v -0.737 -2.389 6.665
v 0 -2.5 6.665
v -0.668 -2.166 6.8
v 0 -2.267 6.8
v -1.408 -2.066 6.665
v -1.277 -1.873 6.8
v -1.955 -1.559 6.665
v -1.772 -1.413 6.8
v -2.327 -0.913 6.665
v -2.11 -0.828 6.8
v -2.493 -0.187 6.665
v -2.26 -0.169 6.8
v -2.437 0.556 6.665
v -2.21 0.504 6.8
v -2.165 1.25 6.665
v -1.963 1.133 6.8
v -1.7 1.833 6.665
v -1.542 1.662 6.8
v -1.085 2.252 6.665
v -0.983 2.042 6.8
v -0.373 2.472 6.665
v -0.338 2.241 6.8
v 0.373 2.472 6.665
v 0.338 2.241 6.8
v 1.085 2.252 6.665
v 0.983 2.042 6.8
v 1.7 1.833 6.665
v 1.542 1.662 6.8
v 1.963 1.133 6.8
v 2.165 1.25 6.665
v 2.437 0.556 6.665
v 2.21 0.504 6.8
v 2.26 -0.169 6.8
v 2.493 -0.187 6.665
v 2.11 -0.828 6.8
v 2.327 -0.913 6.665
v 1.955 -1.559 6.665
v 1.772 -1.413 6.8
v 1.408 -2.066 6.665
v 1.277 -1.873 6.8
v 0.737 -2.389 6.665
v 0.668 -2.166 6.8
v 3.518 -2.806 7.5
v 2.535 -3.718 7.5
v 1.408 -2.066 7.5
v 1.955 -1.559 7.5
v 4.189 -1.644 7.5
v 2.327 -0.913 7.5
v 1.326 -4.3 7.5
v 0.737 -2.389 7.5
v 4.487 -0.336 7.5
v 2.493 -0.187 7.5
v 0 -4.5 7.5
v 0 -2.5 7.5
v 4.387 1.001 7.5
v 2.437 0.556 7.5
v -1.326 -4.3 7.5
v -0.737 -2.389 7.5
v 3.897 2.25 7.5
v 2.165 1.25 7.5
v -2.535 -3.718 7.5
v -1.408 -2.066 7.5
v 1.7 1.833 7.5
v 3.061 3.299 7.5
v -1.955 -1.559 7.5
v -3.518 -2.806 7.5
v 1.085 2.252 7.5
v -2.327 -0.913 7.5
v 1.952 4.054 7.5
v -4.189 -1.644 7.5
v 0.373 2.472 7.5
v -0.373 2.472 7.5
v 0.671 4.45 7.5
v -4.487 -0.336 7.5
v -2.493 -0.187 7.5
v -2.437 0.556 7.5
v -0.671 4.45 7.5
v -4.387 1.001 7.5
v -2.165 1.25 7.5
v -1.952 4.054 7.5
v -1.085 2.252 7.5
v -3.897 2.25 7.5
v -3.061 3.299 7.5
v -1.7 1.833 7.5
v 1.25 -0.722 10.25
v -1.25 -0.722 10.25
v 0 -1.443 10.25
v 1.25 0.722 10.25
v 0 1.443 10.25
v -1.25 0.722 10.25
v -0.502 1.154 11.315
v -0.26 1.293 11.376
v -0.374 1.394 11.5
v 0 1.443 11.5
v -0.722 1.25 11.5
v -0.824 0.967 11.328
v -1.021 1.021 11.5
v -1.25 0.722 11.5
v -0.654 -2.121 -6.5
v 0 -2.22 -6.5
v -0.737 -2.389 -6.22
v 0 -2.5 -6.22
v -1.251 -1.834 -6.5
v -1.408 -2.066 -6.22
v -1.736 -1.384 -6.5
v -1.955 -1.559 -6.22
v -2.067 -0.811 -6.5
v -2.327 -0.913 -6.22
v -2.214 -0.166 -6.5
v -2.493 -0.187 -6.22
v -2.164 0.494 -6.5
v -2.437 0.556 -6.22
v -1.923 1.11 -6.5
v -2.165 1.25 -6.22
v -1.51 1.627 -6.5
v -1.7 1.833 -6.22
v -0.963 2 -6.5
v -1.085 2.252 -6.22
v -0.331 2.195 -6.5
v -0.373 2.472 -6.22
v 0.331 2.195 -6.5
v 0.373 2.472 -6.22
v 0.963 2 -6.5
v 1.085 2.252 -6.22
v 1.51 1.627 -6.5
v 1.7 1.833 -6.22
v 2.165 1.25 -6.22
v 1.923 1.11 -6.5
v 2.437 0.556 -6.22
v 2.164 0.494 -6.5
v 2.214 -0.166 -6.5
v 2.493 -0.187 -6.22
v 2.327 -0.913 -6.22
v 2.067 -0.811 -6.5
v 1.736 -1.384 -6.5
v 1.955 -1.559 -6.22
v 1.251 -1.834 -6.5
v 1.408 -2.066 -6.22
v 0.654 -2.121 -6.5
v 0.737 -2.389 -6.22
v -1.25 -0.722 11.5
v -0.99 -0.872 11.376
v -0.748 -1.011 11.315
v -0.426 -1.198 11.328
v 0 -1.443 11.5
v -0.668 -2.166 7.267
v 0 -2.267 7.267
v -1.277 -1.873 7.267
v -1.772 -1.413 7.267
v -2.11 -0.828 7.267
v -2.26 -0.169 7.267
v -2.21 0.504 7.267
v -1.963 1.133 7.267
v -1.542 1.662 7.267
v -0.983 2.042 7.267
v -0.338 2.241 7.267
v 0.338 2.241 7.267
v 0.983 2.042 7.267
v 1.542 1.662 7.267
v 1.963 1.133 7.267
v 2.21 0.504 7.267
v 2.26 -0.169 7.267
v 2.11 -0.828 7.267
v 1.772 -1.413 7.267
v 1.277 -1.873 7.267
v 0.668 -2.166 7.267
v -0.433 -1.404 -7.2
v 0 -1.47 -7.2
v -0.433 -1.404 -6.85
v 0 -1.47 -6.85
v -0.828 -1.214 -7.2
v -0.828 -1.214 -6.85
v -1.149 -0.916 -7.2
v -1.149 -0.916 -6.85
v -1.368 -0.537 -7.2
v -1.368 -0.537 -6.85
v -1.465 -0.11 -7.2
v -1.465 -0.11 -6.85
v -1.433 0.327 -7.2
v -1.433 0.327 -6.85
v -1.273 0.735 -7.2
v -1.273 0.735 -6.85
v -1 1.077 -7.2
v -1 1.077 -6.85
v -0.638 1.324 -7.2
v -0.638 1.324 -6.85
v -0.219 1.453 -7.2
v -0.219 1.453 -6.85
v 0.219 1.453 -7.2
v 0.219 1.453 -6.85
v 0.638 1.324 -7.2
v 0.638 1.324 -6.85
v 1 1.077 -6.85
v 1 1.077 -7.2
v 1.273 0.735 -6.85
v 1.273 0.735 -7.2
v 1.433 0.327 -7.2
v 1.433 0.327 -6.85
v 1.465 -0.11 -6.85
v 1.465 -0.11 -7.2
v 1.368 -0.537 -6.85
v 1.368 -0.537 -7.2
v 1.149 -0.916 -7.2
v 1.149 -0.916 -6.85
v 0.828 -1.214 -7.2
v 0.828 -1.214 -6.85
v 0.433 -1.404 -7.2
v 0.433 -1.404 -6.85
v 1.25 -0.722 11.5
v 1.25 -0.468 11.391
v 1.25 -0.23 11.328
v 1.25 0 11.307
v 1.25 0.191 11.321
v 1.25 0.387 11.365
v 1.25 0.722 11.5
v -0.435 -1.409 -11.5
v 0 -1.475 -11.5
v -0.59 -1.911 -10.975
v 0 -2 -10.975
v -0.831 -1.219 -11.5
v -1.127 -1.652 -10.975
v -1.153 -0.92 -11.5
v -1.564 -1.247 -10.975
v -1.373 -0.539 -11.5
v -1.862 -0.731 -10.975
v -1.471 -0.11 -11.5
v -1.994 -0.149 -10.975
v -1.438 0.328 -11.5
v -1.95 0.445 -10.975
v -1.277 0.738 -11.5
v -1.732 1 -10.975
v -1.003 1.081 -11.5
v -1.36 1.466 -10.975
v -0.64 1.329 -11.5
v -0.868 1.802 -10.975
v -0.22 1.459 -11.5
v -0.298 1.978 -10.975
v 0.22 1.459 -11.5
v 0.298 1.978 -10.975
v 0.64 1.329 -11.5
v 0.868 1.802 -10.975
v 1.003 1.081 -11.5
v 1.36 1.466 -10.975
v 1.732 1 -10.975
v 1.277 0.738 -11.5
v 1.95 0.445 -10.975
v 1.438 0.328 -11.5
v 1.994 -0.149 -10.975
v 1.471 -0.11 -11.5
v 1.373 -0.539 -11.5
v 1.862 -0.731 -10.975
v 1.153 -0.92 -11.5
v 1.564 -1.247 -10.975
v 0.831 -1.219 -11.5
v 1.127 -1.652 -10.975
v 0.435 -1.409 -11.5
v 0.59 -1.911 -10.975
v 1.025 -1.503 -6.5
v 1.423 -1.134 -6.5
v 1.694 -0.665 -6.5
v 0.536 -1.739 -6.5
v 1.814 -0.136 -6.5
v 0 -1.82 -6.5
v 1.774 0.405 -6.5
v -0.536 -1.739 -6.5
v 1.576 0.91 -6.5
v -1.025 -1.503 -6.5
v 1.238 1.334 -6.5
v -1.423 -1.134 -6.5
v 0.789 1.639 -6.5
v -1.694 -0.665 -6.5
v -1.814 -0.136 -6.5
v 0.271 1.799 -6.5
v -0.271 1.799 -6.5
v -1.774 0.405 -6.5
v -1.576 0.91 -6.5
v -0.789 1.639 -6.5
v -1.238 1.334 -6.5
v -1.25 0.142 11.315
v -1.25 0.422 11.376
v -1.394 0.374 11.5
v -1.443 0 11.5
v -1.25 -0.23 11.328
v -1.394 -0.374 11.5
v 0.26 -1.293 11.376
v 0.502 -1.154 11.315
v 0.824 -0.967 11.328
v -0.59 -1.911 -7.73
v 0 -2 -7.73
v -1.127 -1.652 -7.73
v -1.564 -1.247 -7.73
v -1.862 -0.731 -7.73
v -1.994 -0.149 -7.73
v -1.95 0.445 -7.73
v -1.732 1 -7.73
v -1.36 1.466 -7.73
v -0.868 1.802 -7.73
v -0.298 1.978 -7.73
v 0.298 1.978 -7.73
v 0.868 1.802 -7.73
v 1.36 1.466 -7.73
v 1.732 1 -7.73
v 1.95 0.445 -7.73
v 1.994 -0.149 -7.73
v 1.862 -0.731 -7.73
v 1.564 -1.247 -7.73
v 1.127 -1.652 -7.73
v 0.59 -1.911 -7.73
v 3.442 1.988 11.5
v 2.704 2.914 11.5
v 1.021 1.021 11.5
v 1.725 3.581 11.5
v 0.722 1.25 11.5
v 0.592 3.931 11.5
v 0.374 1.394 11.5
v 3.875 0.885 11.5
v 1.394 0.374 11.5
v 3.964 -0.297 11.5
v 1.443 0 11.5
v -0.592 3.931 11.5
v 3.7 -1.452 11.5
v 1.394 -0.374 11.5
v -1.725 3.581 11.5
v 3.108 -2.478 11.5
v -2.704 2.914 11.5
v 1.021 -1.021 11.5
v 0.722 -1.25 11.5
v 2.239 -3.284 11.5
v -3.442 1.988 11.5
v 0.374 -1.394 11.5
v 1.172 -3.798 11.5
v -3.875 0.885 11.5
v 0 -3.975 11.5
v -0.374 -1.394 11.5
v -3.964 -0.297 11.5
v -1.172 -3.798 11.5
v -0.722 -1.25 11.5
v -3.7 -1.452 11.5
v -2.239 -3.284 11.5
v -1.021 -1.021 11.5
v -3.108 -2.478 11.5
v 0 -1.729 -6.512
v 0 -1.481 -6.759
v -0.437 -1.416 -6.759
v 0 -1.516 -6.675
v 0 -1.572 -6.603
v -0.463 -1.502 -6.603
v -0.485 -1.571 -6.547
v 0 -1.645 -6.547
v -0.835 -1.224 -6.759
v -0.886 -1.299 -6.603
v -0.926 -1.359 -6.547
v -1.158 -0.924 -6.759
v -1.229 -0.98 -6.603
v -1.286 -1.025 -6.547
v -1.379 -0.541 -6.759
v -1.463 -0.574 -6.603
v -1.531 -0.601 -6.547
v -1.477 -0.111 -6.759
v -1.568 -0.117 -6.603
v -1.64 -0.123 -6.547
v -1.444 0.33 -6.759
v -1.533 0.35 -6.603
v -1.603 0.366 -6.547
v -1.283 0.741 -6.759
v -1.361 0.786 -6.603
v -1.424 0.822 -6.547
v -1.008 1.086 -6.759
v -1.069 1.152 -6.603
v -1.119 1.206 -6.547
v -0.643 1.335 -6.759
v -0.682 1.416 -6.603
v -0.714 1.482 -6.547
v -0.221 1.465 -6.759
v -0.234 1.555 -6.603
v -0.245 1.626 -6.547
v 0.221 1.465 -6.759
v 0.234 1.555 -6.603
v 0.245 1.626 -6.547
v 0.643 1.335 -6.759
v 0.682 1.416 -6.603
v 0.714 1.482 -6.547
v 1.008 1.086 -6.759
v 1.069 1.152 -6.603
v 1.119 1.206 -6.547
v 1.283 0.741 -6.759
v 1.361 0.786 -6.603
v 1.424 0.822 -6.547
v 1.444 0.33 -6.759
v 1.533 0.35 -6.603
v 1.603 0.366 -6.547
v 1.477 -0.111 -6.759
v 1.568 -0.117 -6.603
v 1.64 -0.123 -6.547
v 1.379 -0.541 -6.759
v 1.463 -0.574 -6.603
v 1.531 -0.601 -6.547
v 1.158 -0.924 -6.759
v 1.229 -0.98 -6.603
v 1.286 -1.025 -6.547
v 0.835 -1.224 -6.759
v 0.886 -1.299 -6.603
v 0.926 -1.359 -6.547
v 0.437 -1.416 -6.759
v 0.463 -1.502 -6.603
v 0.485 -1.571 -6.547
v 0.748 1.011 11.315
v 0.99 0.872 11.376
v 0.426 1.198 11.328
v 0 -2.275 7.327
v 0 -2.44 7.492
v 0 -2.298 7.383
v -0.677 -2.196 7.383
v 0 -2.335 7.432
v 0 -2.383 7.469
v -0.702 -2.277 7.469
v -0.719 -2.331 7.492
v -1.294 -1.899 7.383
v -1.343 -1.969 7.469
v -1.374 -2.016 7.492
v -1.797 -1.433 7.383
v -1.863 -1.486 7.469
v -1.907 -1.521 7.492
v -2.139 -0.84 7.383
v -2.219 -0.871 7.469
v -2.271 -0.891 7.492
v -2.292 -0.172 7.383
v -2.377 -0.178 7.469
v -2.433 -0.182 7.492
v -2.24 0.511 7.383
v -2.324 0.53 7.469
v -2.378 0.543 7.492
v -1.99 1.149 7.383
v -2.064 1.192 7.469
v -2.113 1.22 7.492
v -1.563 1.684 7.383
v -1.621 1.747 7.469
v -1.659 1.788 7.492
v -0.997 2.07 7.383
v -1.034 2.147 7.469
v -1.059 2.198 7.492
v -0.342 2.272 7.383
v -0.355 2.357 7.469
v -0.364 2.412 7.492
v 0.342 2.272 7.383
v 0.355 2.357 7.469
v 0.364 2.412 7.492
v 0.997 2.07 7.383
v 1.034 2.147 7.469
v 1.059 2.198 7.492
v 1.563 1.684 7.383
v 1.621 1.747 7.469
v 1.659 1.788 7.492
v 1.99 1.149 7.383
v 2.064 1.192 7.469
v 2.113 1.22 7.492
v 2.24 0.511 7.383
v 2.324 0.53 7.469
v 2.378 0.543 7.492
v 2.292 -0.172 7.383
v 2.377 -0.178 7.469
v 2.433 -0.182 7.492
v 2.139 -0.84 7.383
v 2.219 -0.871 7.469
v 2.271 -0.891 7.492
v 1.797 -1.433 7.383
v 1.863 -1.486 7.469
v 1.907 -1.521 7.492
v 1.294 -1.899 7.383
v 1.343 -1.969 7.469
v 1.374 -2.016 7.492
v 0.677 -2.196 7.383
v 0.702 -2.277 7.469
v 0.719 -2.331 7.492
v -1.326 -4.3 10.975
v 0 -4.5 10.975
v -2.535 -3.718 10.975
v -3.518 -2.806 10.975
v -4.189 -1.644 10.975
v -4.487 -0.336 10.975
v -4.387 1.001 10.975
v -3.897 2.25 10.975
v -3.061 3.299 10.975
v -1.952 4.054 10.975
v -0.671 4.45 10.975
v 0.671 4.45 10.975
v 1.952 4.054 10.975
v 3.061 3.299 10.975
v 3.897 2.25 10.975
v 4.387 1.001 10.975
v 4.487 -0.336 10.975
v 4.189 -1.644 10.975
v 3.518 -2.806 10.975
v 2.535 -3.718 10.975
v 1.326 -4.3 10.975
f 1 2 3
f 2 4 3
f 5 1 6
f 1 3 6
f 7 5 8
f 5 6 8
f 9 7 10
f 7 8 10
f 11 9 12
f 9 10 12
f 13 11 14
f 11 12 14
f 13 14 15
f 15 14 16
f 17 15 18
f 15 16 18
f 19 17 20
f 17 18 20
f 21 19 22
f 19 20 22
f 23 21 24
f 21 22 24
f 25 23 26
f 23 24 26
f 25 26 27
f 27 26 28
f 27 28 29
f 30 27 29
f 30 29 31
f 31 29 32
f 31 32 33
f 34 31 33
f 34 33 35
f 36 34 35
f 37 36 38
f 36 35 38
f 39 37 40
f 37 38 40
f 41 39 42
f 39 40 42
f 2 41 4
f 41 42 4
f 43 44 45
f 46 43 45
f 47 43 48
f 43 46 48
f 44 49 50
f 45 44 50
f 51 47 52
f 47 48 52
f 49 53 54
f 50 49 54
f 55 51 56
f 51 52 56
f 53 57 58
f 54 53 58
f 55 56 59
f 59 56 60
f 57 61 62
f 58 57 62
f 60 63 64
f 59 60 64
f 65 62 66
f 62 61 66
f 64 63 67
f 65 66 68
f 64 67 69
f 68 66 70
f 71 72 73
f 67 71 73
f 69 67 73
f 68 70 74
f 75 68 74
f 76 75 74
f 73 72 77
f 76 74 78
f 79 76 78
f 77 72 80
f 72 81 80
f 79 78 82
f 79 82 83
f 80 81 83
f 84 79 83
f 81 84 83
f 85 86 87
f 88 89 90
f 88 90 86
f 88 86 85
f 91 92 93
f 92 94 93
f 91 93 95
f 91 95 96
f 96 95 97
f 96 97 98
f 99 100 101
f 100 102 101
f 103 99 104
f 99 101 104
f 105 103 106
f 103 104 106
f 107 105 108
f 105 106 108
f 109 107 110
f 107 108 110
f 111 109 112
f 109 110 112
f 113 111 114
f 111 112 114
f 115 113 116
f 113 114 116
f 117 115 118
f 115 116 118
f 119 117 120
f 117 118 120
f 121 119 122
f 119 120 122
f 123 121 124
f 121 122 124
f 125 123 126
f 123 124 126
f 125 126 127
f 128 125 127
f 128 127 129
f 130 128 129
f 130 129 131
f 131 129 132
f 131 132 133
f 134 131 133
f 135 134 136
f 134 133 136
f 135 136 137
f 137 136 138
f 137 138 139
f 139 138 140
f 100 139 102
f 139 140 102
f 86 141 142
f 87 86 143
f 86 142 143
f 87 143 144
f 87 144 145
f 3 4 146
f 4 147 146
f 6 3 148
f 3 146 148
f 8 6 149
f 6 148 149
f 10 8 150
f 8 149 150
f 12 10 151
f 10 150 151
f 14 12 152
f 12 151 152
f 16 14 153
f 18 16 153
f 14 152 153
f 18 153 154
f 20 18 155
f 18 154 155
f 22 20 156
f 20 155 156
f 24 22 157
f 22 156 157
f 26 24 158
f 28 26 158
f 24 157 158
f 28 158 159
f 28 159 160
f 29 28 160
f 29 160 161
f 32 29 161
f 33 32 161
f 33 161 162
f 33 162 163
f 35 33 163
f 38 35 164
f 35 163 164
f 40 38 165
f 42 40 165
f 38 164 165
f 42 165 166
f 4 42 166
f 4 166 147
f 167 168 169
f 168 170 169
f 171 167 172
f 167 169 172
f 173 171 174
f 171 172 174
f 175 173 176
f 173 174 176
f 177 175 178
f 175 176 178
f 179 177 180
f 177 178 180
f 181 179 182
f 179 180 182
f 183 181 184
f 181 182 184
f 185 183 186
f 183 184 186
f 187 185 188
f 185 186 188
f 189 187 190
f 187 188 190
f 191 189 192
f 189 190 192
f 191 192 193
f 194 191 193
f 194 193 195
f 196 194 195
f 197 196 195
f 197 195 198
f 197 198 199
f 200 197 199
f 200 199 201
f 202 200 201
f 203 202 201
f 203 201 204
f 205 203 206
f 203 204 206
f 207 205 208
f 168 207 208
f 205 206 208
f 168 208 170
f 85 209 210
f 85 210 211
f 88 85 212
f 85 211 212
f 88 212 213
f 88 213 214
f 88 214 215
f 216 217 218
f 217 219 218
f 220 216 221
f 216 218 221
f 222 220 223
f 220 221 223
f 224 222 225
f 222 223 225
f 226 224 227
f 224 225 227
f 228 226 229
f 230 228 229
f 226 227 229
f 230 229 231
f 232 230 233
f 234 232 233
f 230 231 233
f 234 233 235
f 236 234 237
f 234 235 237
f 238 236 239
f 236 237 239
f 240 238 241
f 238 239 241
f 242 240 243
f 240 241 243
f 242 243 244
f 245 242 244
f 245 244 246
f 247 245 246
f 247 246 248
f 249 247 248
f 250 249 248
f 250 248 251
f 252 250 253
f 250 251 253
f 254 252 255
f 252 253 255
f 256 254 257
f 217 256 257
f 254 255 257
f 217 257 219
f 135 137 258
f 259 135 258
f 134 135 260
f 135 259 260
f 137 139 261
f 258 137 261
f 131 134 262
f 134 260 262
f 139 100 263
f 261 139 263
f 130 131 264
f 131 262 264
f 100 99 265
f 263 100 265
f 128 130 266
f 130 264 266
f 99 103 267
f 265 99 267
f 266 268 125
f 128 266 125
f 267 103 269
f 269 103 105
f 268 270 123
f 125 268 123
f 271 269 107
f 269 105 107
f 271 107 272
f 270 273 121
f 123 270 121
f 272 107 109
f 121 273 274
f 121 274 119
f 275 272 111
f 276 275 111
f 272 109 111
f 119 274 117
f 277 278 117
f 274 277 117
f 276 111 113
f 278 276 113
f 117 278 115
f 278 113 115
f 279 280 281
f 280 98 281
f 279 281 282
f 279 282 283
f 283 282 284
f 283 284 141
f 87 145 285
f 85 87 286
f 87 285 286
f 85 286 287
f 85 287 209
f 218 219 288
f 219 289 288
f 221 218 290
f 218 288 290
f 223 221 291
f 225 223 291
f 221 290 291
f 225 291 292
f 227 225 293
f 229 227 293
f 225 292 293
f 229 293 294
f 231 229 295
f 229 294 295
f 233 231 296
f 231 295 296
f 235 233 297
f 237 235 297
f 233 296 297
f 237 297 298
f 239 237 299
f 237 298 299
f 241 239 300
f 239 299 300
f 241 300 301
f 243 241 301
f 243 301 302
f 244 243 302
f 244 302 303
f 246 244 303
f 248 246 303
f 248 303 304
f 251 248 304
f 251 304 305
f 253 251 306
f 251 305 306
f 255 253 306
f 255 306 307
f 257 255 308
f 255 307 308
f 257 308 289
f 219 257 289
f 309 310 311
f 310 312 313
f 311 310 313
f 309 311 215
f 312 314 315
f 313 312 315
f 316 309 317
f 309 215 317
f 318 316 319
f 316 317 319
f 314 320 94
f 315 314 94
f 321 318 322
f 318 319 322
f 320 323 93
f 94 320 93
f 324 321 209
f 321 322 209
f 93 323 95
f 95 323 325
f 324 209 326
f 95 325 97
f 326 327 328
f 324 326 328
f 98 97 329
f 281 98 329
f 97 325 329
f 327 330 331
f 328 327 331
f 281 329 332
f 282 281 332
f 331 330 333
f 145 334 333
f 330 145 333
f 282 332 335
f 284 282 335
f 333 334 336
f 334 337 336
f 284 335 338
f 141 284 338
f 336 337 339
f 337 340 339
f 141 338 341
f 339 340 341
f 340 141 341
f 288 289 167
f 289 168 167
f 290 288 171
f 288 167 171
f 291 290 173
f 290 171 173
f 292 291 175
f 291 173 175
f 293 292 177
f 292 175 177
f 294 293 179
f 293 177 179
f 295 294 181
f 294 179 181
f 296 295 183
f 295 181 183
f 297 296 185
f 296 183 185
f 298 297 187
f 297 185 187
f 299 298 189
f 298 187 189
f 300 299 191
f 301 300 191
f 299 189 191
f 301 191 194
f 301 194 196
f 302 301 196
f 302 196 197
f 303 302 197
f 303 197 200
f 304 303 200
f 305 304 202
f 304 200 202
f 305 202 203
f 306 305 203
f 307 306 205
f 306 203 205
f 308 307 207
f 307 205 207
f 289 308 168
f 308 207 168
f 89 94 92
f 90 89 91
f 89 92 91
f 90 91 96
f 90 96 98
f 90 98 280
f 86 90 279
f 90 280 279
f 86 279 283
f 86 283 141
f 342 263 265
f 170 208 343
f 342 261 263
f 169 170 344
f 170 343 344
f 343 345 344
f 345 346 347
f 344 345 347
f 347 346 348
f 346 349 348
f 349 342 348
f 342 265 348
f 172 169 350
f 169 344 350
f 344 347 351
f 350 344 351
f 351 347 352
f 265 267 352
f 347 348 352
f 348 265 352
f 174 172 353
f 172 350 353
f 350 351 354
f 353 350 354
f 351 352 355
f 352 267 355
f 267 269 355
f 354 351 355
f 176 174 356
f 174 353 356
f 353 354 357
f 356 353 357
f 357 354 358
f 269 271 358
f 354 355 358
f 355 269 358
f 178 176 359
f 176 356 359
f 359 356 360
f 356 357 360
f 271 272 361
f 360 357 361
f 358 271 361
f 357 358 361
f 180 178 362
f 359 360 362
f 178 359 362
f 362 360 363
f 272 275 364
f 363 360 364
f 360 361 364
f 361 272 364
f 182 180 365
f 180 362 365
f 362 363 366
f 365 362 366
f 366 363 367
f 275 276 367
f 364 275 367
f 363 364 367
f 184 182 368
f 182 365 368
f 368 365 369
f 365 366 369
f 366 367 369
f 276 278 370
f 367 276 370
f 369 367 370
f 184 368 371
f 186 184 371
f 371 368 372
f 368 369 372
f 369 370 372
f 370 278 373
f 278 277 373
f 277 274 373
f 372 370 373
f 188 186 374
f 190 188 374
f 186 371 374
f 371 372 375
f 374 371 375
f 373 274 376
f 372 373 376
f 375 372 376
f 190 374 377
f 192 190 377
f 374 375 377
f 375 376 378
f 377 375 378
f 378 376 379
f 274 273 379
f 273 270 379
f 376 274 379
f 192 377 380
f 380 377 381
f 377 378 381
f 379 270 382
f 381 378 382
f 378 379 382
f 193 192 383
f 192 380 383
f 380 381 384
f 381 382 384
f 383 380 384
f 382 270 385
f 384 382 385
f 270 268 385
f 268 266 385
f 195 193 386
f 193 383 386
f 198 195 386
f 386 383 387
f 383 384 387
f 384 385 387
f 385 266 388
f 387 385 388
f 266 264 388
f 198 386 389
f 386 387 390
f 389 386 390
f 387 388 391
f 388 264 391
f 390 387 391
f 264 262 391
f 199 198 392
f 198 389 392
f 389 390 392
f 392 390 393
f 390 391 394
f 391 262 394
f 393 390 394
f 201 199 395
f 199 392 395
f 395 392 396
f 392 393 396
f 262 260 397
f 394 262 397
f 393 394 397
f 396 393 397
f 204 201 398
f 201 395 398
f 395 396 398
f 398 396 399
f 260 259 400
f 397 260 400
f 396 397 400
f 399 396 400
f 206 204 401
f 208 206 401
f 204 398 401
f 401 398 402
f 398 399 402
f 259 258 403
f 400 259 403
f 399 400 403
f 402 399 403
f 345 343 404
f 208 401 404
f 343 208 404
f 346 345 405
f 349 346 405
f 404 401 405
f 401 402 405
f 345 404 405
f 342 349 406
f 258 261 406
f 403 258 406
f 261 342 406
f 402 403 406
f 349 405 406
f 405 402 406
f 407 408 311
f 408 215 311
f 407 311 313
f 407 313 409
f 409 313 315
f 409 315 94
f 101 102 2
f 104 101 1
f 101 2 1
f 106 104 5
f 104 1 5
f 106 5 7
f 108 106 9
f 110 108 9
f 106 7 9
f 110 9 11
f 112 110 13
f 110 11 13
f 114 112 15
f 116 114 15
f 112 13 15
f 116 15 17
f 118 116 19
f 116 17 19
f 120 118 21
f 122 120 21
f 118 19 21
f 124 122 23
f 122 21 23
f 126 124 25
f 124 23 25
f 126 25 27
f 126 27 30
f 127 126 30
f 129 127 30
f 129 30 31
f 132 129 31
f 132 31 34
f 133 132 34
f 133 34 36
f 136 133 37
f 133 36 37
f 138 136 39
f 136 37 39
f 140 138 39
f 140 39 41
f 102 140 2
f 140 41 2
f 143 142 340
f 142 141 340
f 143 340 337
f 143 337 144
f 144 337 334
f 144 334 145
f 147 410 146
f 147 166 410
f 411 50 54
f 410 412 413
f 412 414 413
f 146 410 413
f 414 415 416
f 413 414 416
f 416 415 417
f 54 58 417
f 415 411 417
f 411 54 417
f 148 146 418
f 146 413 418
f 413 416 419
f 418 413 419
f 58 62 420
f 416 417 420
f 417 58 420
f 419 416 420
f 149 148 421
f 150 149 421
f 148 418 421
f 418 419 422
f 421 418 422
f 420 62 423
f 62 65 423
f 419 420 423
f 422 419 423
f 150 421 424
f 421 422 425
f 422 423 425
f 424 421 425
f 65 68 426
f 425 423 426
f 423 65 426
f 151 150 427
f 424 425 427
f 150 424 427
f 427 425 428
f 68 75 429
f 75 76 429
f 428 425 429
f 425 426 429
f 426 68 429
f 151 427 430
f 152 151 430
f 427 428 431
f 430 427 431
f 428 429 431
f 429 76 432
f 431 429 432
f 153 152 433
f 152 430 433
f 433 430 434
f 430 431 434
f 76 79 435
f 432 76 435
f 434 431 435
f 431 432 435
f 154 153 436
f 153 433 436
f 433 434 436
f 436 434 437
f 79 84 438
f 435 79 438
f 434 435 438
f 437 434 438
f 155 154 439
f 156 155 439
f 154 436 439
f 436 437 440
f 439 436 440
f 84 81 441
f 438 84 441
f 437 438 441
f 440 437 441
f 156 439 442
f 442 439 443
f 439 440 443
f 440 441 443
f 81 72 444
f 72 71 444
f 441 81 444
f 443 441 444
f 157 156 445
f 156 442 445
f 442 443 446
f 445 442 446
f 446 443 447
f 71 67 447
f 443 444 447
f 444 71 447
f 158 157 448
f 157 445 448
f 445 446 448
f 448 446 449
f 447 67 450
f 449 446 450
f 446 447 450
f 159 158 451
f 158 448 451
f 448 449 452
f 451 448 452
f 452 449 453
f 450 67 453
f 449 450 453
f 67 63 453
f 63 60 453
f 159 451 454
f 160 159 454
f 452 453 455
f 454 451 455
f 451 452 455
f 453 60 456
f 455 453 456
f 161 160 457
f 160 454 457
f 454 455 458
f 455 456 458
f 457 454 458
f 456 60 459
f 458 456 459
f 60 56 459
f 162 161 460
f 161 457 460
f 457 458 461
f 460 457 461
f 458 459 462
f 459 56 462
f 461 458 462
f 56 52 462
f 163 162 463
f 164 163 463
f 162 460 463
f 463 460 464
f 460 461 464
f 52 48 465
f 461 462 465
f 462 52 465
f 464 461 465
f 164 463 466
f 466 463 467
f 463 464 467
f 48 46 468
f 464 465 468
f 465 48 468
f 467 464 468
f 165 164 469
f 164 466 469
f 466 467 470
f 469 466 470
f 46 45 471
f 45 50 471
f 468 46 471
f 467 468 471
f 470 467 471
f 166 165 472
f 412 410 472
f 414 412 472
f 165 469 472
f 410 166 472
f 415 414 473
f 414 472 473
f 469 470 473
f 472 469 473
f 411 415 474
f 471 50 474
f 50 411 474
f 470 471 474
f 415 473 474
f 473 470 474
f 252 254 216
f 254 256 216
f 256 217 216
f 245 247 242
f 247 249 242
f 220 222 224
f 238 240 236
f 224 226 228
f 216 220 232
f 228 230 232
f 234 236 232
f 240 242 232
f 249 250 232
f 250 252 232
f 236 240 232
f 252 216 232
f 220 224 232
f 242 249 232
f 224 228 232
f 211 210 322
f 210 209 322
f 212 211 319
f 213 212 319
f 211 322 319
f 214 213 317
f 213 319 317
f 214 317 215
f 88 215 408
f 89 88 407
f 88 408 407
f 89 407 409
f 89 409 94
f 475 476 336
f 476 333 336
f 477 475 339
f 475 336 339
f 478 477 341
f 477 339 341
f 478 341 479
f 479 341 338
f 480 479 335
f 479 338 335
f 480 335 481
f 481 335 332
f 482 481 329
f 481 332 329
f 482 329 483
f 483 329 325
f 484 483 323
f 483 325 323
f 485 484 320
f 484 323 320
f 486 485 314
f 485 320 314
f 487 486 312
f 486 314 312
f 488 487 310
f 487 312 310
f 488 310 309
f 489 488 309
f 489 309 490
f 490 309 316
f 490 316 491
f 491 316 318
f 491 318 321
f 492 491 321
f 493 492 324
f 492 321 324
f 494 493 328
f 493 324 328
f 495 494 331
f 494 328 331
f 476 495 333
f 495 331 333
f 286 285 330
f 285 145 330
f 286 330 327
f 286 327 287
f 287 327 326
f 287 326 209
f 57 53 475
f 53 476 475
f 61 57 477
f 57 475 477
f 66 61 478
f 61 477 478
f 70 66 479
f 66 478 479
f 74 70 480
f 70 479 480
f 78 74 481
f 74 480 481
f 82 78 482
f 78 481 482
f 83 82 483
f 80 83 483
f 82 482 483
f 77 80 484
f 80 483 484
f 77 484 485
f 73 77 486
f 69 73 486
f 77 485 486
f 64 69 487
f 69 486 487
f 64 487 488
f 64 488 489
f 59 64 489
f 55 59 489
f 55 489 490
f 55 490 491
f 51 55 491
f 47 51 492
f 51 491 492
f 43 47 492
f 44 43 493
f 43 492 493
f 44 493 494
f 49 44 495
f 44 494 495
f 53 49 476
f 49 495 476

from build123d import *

# Parameters (mm, degrees)
CUT_EXTRUDE1_DEPTH = 1.25
SKETCH4_R          = 1.443375673
CUT_EXTRUDE2_DEPTH = 1.25
CUT_EXTRUDE2_DRAFT = -45


with BuildPart() as part:
    # Sketch2 → Revolve1 (revolve)
    with BuildSketch(Plane(origin=(0, 0, 0), x_dir=(0, 0, -1), z_dir=(1, 0, 0))):
        with BuildLine():
            Line((11.5, 0), (11.5, 1.475))
            Line((11.5, 1.475), (10.975, 2))
            Line((10.975, 2), (7.73044056, 2))
            Line((7.73044056, 2), (7.2, 1.46955944))
            Line((7.2, 1.46955944), (6.85, 1.46955944))
            ThreePointArc((6.85, 1.46955944), (6.602512627, 1.572072067), (6.5, 1.81955944))
            Line((6.5, 1.81955944), (6.5, 2.22))
            Line((6.5, 2.22), (6.22, 2.5))
            Line((6.22, 2.5), (-6.665284937, 2.5))
            Line((-6.665284937, 2.5), (-6.8, 2.266666667))
            Line((-6.8, 2.266666667), (-7.266666667, 2.266666667))
            ThreePointArc((-7.266666667, 2.266666667), (-7.431658249, 2.335008418), (-7.5, 2.5))
            Line((-7.5, 2.5), (-7.5, 4.5))
            Line((-7.5, 4.5), (-10.975, 4.5))
            Line((-10.975, 4.5), (-11.5, 3.975))
            Line((-11.5, 3.975), (-11.5, 0))
            Line((-11.5, 0), (11.5, 0))
        make_face()
    revolve(axis=Axis((0, 0, 11.5), (0, 0, -1)))

    # Sketch3 → Cut-Extrude1 (cut)
    with BuildSketch(Plane.XY.offset(11.5)):
        Polygon((0, 1.443375673), (-1.25, 0.721687836), (-1.25, -0.721687836), (0, -1.443375673), (1.25, -0.721687836), (1.25, 0.721687836), align=None)
    extrude(amount=-CUT_EXTRUDE1_DEPTH, mode=Mode.SUBTRACT)


with BuildPart() as cut_extrude2_tool:
    # Sketch4 → Cut-Extrude2 (with draft: the straight prism first)
    with BuildSketch(Plane.XY.offset(11.5)):
        Circle(SKETCH4_R)
    extrude(amount=-CUT_EXTRUDE2_DEPTH)
    # Cut-Extrude2: the draft: its side faces are tilted about the plane it starts from
    cut_extrude2_sides = [cut_extrude2_tool.faces().sort_by_distance(p)[0] for p in [
        (-1.443375673, 0, 10.875),
    ]]
    draft(cut_extrude2_sides, Plane.XY.offset(11.5), CUT_EXTRUDE2_DRAFT)


with BuildPart() as part_1:
    add(part.part)

    # Cut-Extrude2: cut by cut_extrude2_tool
    add(cut_extrude2_tool.part, mode=Mode.SUBTRACT)


solid = part_1.part
